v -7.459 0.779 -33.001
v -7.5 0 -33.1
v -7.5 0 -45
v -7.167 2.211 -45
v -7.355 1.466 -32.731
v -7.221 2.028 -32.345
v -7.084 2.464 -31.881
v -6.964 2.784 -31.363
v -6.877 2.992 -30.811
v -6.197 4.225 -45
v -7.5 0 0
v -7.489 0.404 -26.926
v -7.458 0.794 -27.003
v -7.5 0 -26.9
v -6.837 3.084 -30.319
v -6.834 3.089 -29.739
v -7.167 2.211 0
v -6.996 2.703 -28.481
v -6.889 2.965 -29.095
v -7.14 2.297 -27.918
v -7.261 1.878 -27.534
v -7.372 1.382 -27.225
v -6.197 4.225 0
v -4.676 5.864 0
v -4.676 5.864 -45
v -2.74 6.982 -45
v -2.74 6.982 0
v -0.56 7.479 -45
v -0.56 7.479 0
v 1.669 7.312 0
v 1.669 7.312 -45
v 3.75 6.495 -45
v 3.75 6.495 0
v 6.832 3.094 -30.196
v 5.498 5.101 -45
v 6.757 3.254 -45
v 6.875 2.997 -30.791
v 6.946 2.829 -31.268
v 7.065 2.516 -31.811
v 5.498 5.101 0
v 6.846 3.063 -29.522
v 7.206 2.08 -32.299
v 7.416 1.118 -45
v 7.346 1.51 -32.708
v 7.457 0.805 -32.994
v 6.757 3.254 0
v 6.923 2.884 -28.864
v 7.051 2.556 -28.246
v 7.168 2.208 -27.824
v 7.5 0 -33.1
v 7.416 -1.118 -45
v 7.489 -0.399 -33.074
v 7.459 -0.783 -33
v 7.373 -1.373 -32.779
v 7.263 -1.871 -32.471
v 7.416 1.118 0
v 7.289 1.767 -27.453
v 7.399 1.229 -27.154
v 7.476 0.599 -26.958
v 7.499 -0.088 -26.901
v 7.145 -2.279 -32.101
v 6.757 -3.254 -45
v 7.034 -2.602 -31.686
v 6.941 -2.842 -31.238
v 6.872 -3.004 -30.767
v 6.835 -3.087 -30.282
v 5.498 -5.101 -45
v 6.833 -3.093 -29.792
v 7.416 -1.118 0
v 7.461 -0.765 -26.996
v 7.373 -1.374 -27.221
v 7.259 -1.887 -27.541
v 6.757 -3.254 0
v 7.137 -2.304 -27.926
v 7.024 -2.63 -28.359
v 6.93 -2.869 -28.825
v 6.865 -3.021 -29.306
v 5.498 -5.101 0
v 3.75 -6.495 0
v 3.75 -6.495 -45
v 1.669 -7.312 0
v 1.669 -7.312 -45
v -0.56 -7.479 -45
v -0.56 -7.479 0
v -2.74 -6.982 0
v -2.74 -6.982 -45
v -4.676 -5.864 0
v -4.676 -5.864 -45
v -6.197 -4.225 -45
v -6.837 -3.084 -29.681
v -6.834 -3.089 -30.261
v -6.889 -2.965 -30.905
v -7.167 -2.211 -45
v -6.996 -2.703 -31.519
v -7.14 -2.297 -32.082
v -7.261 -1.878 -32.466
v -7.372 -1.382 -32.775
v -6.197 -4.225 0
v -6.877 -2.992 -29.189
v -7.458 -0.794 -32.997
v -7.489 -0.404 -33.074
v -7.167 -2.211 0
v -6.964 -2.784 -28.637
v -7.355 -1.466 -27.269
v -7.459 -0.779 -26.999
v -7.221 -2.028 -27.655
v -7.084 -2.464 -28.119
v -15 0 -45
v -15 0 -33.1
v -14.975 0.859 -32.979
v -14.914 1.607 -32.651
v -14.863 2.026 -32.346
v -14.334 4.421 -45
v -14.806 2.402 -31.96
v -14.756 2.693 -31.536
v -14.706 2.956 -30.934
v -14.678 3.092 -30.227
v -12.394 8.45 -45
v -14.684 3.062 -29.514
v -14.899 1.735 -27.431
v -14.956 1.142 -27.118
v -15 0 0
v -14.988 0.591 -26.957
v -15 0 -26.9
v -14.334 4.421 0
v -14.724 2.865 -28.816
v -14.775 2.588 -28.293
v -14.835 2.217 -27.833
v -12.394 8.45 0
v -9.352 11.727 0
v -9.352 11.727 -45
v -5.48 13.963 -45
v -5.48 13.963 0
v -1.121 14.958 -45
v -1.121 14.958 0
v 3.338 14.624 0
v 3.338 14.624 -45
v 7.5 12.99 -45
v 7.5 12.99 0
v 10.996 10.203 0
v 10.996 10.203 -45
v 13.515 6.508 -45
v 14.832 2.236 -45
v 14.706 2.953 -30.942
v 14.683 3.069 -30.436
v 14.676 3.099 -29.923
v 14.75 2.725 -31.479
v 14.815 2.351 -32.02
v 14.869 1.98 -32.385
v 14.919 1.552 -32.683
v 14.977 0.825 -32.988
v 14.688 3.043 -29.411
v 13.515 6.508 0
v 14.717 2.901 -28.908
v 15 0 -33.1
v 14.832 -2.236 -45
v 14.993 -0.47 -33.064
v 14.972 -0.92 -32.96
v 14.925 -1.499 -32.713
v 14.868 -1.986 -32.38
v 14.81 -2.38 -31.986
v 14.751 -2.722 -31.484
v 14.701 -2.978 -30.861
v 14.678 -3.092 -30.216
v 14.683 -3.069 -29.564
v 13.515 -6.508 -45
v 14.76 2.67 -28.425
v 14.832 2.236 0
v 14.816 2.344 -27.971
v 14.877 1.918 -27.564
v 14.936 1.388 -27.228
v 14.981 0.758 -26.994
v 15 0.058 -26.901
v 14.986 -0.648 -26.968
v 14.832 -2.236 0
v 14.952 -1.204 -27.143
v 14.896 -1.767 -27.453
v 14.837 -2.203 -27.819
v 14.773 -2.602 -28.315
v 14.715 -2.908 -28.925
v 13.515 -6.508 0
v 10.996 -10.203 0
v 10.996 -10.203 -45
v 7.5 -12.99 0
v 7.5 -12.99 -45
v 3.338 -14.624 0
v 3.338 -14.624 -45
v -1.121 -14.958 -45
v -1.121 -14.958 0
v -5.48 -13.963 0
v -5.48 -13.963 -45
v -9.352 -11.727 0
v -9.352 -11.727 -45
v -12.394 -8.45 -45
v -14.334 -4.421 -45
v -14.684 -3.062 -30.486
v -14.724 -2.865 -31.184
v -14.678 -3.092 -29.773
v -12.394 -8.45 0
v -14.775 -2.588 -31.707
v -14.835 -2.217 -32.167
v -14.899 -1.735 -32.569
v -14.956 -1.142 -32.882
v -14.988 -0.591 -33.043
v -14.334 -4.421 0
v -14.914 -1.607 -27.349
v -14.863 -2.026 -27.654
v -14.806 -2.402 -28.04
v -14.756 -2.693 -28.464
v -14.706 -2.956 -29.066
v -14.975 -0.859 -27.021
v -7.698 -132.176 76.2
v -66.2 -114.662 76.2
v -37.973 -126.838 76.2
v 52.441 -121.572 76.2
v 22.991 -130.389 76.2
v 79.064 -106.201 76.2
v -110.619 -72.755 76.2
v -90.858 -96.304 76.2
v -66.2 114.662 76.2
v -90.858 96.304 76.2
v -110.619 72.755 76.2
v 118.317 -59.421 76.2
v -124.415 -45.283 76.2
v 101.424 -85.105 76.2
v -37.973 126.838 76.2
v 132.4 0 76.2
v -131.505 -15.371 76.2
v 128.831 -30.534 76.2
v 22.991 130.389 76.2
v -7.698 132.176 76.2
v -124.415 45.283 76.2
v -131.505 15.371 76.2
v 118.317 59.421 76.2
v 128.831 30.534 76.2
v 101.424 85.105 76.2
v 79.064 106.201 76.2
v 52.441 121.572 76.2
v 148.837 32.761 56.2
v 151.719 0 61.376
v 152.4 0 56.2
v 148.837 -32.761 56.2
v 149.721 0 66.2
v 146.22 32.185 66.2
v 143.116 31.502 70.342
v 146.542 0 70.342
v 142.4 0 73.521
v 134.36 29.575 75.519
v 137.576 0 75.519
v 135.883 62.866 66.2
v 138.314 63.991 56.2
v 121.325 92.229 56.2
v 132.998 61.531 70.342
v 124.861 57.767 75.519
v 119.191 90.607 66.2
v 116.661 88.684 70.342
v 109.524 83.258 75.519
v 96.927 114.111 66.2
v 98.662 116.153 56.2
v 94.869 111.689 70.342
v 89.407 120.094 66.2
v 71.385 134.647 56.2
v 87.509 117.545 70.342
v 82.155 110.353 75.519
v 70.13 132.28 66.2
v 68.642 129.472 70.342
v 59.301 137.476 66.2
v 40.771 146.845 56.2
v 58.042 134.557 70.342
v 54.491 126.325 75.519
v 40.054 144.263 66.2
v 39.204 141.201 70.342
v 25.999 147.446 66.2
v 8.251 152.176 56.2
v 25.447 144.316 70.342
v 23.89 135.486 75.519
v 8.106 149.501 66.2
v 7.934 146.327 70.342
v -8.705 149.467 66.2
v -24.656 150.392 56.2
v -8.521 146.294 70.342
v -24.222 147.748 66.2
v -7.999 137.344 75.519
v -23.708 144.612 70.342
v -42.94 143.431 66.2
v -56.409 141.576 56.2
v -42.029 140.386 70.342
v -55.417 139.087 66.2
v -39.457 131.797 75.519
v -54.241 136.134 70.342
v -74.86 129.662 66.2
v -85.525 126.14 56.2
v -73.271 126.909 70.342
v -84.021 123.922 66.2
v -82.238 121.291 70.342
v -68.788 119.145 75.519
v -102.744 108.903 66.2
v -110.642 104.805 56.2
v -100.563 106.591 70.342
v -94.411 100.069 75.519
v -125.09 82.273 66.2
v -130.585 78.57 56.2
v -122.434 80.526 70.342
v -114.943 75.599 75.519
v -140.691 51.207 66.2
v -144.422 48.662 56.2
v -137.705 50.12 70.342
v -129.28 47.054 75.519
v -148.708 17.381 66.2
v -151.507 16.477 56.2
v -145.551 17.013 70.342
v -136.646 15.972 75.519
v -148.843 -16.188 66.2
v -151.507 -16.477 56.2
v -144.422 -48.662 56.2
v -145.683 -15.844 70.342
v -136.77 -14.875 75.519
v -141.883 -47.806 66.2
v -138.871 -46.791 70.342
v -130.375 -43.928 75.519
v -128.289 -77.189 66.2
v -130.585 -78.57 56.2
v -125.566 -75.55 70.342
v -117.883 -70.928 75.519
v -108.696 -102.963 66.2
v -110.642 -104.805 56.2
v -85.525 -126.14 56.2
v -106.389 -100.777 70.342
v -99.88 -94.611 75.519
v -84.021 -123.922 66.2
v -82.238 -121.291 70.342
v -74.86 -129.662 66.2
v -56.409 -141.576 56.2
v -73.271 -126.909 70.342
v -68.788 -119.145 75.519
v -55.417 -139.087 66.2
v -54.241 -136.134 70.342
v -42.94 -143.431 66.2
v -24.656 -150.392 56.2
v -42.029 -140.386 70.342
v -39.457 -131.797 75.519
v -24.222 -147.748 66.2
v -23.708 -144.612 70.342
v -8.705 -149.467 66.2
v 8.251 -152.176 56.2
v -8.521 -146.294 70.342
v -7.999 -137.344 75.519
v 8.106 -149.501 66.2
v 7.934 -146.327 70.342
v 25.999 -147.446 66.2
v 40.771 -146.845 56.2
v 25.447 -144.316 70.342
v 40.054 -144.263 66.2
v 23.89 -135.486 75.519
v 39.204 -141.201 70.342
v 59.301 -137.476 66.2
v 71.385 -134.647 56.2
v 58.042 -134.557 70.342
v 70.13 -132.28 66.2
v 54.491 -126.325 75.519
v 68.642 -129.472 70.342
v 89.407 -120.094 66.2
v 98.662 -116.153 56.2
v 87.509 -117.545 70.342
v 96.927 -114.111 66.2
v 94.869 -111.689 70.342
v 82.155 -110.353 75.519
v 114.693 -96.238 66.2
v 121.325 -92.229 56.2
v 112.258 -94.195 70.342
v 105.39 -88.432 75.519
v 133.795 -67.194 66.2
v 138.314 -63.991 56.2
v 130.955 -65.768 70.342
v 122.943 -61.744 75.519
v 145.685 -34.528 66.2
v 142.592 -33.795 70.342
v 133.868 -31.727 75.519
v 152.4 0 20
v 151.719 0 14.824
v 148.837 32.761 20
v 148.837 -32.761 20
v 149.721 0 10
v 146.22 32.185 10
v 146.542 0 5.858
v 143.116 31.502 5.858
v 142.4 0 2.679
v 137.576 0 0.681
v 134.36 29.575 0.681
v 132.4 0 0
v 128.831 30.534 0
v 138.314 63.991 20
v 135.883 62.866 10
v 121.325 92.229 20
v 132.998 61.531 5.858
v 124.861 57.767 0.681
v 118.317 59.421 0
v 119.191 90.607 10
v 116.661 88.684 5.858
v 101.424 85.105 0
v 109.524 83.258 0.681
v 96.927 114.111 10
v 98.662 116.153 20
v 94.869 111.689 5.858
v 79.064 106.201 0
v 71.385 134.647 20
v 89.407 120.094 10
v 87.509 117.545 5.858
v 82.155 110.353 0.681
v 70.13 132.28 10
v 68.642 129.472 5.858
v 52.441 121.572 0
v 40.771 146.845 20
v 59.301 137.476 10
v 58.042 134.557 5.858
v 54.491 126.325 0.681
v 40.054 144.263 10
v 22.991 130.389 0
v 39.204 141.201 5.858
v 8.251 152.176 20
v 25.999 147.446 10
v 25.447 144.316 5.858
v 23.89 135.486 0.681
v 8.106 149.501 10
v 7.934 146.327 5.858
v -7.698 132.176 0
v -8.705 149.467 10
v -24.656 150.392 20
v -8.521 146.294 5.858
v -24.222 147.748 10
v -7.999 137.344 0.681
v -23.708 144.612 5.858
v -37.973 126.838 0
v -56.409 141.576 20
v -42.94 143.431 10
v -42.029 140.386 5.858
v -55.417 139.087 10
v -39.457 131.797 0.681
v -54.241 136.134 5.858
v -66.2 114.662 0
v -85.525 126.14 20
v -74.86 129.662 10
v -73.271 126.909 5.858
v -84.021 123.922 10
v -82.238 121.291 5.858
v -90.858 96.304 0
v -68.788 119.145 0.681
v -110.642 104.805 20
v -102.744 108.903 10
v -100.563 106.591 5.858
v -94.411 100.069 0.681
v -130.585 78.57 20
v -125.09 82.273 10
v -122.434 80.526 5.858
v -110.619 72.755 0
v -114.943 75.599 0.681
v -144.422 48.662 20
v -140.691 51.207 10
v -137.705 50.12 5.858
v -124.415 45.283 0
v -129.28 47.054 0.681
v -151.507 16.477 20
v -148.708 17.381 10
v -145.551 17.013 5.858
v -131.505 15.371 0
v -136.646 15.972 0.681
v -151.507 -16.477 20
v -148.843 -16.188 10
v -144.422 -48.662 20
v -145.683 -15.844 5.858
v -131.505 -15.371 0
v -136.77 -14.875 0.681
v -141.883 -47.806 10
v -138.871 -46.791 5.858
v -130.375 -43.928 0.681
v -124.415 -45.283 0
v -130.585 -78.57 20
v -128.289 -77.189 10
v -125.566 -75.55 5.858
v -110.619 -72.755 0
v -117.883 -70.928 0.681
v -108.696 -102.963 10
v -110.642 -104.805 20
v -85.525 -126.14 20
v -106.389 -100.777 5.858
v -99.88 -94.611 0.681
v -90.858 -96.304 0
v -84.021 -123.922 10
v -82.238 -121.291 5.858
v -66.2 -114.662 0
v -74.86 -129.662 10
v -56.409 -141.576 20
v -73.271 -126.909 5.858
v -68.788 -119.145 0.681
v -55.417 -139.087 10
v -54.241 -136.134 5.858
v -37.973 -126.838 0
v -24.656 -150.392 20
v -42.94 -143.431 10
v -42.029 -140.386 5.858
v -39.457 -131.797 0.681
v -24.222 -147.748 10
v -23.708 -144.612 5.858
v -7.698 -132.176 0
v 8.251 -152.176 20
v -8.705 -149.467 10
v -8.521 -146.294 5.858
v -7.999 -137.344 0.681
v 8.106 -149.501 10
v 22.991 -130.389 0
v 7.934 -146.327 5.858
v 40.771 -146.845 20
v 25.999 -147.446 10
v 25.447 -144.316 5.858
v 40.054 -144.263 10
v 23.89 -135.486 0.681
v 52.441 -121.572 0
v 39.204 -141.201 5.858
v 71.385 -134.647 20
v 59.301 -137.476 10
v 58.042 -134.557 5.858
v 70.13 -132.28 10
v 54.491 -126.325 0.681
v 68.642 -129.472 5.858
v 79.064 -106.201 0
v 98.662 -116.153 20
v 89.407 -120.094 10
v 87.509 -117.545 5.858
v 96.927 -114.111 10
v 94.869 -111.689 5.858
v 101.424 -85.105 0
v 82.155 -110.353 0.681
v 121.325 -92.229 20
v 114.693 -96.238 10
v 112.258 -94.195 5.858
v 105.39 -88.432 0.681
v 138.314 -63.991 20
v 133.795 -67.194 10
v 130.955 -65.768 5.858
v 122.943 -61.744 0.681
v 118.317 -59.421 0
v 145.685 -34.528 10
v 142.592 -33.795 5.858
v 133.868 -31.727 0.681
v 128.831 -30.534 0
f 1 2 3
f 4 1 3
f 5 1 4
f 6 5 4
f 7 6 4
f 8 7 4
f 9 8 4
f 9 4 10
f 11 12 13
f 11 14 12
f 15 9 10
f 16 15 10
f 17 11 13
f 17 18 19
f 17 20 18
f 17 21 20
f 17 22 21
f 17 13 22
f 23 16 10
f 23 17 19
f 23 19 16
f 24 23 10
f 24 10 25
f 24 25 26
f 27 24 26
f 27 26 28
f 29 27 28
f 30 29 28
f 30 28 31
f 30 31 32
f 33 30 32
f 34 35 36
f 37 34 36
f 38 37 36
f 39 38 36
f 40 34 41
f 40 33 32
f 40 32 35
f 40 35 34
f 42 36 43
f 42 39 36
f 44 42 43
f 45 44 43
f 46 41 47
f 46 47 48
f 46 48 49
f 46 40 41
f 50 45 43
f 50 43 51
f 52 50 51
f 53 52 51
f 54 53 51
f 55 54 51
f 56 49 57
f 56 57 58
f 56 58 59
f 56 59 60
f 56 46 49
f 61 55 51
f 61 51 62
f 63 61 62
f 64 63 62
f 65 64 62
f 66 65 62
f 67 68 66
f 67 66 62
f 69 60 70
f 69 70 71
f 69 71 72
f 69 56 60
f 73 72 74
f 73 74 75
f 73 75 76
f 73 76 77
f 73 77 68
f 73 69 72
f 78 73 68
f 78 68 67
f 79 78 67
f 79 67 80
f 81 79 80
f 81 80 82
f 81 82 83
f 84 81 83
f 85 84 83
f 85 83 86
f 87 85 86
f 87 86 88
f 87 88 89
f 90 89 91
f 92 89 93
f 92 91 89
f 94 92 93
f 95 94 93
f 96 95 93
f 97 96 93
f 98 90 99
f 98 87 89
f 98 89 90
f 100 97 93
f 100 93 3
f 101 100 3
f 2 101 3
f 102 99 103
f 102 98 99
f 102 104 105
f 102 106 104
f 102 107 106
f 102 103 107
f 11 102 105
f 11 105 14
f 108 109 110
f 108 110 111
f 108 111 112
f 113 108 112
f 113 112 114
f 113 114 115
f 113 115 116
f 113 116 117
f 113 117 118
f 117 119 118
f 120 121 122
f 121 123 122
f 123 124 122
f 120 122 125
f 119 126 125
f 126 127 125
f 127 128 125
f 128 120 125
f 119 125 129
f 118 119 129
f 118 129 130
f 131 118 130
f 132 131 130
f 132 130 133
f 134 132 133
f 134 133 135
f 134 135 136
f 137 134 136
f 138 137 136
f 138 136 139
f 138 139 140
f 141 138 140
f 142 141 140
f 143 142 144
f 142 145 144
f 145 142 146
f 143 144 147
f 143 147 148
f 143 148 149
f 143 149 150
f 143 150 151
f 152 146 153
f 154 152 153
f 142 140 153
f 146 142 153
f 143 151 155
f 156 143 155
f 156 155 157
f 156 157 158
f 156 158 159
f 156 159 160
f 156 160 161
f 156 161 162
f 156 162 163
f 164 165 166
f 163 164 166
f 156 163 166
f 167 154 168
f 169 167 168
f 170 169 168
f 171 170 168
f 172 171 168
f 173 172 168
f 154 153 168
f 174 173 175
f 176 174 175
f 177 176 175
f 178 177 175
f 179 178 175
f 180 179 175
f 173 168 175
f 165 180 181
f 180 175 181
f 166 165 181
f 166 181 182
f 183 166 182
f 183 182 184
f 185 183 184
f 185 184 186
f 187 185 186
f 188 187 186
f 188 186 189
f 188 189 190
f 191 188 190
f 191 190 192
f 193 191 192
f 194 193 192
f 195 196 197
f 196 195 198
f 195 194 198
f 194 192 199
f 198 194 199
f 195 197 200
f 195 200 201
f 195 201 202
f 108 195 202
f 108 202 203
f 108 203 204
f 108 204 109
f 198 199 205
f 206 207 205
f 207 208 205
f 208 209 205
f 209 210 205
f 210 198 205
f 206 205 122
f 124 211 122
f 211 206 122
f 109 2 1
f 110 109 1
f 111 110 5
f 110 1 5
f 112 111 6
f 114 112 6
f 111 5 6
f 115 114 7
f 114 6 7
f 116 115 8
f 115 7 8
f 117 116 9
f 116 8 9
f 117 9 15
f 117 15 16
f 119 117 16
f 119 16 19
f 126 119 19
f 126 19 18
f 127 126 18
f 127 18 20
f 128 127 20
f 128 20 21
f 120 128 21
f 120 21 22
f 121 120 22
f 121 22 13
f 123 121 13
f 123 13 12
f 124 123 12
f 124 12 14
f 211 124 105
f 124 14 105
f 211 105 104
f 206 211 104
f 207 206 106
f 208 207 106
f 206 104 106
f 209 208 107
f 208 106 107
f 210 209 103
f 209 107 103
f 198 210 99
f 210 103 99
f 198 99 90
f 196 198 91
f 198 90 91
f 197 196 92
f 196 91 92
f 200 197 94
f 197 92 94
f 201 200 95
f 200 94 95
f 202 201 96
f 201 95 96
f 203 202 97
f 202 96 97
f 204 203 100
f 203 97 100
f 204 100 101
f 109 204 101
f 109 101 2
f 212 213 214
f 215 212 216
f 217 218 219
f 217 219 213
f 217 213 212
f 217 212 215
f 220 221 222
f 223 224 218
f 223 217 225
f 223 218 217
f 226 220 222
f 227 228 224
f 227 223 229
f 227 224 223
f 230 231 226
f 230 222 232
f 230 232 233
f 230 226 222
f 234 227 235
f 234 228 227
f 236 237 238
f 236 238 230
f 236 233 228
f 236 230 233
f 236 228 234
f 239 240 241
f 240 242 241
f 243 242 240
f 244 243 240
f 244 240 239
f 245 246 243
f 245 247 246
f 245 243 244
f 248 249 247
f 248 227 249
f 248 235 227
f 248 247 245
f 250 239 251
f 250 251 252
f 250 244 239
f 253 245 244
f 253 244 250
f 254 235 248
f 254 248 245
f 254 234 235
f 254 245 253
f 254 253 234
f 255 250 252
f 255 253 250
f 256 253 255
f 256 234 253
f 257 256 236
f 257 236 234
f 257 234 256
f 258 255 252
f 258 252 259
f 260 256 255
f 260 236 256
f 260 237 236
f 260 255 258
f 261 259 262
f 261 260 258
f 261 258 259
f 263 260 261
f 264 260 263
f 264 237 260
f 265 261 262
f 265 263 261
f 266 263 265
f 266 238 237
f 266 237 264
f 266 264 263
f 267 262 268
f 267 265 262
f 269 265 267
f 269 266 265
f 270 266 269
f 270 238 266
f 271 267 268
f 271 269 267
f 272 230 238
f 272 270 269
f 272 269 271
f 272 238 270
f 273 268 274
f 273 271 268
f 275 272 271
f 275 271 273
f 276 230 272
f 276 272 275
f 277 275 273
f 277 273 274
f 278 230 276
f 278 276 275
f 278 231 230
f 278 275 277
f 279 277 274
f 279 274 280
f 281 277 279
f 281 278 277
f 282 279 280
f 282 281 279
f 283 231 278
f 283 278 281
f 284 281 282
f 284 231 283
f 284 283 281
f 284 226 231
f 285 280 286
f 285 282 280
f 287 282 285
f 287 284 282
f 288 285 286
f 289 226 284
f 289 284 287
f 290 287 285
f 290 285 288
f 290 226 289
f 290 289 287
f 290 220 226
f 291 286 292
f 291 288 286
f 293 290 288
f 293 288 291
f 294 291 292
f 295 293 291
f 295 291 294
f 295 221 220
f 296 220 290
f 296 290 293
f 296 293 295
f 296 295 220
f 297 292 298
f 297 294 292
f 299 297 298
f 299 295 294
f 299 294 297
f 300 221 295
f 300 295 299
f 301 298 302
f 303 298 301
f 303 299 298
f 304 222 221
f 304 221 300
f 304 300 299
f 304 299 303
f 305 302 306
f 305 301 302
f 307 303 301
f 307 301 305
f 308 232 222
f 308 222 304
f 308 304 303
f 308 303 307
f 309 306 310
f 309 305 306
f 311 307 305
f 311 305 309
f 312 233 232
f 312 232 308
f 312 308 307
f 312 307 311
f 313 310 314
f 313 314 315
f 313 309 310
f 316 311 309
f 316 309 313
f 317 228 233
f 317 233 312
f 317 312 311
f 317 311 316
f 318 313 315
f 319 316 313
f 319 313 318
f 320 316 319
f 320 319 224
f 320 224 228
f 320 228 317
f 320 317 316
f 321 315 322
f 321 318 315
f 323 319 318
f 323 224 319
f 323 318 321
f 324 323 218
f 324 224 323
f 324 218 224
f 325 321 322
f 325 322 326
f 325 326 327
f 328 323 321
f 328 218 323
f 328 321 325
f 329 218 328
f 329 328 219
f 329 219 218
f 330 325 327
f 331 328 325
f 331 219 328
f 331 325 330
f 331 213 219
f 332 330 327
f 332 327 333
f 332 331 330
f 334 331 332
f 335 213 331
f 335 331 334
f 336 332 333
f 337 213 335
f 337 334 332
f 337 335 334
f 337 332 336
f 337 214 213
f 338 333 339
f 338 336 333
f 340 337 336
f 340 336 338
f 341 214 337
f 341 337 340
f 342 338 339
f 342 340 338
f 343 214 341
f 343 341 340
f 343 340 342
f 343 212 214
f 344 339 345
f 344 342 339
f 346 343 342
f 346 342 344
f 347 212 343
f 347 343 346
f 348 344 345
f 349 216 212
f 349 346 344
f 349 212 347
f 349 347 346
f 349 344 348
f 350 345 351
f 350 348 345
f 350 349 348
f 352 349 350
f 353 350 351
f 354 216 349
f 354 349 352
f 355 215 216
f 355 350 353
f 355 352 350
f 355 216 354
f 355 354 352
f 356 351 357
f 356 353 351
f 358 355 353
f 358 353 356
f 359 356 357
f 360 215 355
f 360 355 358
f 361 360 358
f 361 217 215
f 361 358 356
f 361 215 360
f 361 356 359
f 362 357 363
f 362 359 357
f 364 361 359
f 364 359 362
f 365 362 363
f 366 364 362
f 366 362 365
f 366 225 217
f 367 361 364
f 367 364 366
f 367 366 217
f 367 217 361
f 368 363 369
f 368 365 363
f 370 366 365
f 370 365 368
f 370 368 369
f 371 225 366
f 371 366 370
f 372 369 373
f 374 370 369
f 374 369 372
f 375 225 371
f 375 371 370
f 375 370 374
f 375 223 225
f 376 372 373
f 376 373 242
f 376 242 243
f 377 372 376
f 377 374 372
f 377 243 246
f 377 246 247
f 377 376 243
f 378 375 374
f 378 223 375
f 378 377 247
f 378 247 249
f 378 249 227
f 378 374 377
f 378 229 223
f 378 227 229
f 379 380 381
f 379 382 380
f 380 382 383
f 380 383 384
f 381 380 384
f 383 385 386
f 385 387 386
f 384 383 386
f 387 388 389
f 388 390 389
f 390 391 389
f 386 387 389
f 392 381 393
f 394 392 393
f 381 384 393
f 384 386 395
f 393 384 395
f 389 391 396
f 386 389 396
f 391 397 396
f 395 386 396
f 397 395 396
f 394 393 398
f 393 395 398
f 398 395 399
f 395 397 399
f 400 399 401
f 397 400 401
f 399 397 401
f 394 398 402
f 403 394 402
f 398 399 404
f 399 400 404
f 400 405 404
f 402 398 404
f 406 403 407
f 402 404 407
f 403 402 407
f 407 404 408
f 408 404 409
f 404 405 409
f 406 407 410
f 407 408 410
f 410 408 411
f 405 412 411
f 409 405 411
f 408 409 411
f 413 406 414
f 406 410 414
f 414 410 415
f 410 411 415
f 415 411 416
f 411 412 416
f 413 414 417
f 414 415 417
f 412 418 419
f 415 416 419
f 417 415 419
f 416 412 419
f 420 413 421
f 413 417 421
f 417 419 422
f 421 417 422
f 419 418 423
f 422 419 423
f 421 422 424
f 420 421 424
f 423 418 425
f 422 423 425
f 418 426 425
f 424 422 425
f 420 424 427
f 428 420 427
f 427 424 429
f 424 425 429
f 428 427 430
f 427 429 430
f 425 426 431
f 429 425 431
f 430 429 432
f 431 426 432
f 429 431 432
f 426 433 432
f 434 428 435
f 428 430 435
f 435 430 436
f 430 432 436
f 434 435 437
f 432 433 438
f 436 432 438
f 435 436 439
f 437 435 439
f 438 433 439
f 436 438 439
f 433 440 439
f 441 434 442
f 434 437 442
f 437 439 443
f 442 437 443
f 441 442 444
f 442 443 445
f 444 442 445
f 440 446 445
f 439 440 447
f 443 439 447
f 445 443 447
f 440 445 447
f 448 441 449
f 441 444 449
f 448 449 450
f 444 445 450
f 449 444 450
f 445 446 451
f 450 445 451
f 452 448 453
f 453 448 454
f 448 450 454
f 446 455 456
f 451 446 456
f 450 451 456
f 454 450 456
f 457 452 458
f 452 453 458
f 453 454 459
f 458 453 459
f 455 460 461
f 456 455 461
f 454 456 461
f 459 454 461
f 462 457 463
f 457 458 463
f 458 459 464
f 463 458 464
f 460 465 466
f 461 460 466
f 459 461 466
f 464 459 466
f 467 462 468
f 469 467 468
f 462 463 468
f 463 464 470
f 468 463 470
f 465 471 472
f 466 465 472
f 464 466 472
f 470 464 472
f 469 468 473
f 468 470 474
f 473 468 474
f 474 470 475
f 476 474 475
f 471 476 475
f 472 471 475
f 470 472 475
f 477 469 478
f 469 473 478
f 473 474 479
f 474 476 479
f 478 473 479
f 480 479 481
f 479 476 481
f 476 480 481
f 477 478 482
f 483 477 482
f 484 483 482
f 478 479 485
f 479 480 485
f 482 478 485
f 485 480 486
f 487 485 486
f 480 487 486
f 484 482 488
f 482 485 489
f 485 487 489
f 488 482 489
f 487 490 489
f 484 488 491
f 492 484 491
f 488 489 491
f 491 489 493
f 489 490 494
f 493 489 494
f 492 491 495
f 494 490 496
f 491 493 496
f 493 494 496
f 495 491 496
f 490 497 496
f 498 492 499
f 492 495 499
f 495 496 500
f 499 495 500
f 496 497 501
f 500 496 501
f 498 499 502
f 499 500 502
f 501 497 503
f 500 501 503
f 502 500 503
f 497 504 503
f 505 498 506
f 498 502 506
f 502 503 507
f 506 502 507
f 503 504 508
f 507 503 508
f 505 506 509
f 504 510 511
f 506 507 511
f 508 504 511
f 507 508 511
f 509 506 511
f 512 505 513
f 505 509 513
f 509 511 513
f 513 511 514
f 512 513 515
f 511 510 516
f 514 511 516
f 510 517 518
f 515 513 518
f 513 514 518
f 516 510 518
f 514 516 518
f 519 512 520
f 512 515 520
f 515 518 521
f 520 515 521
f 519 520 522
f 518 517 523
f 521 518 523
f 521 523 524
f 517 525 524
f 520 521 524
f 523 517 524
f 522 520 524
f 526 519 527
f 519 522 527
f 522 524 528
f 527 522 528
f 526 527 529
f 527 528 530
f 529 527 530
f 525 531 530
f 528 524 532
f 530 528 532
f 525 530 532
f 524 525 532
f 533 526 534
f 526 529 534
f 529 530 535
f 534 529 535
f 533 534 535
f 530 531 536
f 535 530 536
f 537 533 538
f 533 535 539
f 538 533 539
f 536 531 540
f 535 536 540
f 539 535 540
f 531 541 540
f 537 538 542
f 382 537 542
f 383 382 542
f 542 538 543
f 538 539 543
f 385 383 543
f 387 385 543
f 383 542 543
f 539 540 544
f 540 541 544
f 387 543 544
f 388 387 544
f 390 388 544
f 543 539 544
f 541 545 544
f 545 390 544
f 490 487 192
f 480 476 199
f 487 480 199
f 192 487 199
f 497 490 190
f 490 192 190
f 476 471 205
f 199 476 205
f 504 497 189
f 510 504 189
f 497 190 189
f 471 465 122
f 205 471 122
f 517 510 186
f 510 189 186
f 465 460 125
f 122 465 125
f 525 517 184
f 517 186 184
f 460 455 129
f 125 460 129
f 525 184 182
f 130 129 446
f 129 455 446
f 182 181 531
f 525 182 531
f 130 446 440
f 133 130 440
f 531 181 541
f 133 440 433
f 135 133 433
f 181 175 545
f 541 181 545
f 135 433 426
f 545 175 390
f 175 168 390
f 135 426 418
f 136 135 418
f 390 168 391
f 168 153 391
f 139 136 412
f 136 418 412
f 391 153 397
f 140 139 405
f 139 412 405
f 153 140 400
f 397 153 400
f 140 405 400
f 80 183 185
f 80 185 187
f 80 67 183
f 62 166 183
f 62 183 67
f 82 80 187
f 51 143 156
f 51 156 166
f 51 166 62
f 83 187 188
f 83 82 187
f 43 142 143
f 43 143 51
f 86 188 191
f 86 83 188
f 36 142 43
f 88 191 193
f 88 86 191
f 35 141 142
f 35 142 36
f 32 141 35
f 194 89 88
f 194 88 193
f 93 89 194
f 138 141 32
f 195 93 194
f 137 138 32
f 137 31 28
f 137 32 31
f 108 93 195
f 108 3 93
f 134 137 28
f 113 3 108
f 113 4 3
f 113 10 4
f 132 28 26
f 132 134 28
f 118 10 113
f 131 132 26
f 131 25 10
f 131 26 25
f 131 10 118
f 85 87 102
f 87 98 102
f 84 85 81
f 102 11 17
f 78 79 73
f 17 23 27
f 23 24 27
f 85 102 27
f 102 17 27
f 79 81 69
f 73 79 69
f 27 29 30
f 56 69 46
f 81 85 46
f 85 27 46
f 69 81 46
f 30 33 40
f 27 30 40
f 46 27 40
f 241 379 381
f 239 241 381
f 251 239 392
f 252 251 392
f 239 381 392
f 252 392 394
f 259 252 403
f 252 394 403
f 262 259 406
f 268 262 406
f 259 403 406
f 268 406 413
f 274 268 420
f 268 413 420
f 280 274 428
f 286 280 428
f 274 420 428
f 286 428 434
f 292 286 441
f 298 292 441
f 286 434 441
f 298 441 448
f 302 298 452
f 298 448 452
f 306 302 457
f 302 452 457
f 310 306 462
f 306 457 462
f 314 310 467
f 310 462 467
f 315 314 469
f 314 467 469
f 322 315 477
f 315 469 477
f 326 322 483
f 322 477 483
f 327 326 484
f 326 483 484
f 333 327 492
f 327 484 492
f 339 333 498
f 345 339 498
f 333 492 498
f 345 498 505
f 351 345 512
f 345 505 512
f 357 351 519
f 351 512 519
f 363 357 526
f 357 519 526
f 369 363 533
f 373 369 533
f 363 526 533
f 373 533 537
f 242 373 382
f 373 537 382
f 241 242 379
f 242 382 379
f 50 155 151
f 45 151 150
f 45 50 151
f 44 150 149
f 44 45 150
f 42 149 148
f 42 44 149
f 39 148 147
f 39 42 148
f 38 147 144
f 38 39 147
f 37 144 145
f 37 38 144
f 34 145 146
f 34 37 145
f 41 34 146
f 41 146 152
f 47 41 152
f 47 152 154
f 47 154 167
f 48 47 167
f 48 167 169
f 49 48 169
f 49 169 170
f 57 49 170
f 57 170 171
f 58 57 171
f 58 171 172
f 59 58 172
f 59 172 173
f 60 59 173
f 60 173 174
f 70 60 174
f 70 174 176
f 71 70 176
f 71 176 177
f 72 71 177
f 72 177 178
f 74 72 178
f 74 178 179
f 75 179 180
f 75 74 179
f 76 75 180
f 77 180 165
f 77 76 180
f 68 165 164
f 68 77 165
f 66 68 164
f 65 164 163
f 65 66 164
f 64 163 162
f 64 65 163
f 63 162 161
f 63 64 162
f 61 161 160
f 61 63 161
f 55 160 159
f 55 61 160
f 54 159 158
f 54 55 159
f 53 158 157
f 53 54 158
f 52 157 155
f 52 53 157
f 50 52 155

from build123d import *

# Parameters (mm, degrees)
SKETCH1_R               = 152.4
BOSS_EXTRUDE1_DEPTH     = 76.2
FILLET1_R               = 20
SKETCH2_R               = 15
SKETCH2_R_2             = 7.5
BOSS_EXTRUDE2_DEPTH     = 45
SKETCH4_R               = 3.1
CUT_EXTRUDE1_DEPTH      = 153.4
CUT_EXTRUDE1_DEPTH_BACK = 153.4


with BuildPart() as part:
    # Sketch1 → Boss-Extrude1 (new body)
    with BuildSketch(Plane.XY):
        Circle(SKETCH1_R)
    extrude(amount=BOSS_EXTRUDE1_DEPTH)

    # Fillet1
    fillet1_edges = [part.edges().sort_by_distance(p)[0] for p in [
        (-152.4, 0, 0),
        (-152.4, 0, 76.2),
    ]]
    fillet(fillet1_edges, radius=FILLET1_R)

    # Sketch2 → Boss-Extrude2 (add)
    with BuildSketch(Plane(origin=(0, 0, 0), x_dir=(-1, 0, 0), z_dir=(0, 0, -1))):
        Circle(SKETCH2_R)
        Circle(SKETCH2_R_2, mode=Mode.SUBTRACT)
    extrude(amount=BOSS_EXTRUDE2_DEPTH)

    # Sketch4 → Cut-Extrude1 (cut, two sides)
    with BuildSketch(Plane(origin=(0, 0, 0), x_dir=(0, 0, -1), z_dir=(1, 0, 0))) as cut_extrude1_sk:
        with Locations((30, 0)):
            Circle(SKETCH4_R)
    extrude(amount=CUT_EXTRUDE1_DEPTH, mode=Mode.SUBTRACT)
    extrude(cut_extrude1_sk.sketch, amount=-CUT_EXTRUDE1_DEPTH_BACK, mode=Mode.SUBTRACT)


solid = part.part
